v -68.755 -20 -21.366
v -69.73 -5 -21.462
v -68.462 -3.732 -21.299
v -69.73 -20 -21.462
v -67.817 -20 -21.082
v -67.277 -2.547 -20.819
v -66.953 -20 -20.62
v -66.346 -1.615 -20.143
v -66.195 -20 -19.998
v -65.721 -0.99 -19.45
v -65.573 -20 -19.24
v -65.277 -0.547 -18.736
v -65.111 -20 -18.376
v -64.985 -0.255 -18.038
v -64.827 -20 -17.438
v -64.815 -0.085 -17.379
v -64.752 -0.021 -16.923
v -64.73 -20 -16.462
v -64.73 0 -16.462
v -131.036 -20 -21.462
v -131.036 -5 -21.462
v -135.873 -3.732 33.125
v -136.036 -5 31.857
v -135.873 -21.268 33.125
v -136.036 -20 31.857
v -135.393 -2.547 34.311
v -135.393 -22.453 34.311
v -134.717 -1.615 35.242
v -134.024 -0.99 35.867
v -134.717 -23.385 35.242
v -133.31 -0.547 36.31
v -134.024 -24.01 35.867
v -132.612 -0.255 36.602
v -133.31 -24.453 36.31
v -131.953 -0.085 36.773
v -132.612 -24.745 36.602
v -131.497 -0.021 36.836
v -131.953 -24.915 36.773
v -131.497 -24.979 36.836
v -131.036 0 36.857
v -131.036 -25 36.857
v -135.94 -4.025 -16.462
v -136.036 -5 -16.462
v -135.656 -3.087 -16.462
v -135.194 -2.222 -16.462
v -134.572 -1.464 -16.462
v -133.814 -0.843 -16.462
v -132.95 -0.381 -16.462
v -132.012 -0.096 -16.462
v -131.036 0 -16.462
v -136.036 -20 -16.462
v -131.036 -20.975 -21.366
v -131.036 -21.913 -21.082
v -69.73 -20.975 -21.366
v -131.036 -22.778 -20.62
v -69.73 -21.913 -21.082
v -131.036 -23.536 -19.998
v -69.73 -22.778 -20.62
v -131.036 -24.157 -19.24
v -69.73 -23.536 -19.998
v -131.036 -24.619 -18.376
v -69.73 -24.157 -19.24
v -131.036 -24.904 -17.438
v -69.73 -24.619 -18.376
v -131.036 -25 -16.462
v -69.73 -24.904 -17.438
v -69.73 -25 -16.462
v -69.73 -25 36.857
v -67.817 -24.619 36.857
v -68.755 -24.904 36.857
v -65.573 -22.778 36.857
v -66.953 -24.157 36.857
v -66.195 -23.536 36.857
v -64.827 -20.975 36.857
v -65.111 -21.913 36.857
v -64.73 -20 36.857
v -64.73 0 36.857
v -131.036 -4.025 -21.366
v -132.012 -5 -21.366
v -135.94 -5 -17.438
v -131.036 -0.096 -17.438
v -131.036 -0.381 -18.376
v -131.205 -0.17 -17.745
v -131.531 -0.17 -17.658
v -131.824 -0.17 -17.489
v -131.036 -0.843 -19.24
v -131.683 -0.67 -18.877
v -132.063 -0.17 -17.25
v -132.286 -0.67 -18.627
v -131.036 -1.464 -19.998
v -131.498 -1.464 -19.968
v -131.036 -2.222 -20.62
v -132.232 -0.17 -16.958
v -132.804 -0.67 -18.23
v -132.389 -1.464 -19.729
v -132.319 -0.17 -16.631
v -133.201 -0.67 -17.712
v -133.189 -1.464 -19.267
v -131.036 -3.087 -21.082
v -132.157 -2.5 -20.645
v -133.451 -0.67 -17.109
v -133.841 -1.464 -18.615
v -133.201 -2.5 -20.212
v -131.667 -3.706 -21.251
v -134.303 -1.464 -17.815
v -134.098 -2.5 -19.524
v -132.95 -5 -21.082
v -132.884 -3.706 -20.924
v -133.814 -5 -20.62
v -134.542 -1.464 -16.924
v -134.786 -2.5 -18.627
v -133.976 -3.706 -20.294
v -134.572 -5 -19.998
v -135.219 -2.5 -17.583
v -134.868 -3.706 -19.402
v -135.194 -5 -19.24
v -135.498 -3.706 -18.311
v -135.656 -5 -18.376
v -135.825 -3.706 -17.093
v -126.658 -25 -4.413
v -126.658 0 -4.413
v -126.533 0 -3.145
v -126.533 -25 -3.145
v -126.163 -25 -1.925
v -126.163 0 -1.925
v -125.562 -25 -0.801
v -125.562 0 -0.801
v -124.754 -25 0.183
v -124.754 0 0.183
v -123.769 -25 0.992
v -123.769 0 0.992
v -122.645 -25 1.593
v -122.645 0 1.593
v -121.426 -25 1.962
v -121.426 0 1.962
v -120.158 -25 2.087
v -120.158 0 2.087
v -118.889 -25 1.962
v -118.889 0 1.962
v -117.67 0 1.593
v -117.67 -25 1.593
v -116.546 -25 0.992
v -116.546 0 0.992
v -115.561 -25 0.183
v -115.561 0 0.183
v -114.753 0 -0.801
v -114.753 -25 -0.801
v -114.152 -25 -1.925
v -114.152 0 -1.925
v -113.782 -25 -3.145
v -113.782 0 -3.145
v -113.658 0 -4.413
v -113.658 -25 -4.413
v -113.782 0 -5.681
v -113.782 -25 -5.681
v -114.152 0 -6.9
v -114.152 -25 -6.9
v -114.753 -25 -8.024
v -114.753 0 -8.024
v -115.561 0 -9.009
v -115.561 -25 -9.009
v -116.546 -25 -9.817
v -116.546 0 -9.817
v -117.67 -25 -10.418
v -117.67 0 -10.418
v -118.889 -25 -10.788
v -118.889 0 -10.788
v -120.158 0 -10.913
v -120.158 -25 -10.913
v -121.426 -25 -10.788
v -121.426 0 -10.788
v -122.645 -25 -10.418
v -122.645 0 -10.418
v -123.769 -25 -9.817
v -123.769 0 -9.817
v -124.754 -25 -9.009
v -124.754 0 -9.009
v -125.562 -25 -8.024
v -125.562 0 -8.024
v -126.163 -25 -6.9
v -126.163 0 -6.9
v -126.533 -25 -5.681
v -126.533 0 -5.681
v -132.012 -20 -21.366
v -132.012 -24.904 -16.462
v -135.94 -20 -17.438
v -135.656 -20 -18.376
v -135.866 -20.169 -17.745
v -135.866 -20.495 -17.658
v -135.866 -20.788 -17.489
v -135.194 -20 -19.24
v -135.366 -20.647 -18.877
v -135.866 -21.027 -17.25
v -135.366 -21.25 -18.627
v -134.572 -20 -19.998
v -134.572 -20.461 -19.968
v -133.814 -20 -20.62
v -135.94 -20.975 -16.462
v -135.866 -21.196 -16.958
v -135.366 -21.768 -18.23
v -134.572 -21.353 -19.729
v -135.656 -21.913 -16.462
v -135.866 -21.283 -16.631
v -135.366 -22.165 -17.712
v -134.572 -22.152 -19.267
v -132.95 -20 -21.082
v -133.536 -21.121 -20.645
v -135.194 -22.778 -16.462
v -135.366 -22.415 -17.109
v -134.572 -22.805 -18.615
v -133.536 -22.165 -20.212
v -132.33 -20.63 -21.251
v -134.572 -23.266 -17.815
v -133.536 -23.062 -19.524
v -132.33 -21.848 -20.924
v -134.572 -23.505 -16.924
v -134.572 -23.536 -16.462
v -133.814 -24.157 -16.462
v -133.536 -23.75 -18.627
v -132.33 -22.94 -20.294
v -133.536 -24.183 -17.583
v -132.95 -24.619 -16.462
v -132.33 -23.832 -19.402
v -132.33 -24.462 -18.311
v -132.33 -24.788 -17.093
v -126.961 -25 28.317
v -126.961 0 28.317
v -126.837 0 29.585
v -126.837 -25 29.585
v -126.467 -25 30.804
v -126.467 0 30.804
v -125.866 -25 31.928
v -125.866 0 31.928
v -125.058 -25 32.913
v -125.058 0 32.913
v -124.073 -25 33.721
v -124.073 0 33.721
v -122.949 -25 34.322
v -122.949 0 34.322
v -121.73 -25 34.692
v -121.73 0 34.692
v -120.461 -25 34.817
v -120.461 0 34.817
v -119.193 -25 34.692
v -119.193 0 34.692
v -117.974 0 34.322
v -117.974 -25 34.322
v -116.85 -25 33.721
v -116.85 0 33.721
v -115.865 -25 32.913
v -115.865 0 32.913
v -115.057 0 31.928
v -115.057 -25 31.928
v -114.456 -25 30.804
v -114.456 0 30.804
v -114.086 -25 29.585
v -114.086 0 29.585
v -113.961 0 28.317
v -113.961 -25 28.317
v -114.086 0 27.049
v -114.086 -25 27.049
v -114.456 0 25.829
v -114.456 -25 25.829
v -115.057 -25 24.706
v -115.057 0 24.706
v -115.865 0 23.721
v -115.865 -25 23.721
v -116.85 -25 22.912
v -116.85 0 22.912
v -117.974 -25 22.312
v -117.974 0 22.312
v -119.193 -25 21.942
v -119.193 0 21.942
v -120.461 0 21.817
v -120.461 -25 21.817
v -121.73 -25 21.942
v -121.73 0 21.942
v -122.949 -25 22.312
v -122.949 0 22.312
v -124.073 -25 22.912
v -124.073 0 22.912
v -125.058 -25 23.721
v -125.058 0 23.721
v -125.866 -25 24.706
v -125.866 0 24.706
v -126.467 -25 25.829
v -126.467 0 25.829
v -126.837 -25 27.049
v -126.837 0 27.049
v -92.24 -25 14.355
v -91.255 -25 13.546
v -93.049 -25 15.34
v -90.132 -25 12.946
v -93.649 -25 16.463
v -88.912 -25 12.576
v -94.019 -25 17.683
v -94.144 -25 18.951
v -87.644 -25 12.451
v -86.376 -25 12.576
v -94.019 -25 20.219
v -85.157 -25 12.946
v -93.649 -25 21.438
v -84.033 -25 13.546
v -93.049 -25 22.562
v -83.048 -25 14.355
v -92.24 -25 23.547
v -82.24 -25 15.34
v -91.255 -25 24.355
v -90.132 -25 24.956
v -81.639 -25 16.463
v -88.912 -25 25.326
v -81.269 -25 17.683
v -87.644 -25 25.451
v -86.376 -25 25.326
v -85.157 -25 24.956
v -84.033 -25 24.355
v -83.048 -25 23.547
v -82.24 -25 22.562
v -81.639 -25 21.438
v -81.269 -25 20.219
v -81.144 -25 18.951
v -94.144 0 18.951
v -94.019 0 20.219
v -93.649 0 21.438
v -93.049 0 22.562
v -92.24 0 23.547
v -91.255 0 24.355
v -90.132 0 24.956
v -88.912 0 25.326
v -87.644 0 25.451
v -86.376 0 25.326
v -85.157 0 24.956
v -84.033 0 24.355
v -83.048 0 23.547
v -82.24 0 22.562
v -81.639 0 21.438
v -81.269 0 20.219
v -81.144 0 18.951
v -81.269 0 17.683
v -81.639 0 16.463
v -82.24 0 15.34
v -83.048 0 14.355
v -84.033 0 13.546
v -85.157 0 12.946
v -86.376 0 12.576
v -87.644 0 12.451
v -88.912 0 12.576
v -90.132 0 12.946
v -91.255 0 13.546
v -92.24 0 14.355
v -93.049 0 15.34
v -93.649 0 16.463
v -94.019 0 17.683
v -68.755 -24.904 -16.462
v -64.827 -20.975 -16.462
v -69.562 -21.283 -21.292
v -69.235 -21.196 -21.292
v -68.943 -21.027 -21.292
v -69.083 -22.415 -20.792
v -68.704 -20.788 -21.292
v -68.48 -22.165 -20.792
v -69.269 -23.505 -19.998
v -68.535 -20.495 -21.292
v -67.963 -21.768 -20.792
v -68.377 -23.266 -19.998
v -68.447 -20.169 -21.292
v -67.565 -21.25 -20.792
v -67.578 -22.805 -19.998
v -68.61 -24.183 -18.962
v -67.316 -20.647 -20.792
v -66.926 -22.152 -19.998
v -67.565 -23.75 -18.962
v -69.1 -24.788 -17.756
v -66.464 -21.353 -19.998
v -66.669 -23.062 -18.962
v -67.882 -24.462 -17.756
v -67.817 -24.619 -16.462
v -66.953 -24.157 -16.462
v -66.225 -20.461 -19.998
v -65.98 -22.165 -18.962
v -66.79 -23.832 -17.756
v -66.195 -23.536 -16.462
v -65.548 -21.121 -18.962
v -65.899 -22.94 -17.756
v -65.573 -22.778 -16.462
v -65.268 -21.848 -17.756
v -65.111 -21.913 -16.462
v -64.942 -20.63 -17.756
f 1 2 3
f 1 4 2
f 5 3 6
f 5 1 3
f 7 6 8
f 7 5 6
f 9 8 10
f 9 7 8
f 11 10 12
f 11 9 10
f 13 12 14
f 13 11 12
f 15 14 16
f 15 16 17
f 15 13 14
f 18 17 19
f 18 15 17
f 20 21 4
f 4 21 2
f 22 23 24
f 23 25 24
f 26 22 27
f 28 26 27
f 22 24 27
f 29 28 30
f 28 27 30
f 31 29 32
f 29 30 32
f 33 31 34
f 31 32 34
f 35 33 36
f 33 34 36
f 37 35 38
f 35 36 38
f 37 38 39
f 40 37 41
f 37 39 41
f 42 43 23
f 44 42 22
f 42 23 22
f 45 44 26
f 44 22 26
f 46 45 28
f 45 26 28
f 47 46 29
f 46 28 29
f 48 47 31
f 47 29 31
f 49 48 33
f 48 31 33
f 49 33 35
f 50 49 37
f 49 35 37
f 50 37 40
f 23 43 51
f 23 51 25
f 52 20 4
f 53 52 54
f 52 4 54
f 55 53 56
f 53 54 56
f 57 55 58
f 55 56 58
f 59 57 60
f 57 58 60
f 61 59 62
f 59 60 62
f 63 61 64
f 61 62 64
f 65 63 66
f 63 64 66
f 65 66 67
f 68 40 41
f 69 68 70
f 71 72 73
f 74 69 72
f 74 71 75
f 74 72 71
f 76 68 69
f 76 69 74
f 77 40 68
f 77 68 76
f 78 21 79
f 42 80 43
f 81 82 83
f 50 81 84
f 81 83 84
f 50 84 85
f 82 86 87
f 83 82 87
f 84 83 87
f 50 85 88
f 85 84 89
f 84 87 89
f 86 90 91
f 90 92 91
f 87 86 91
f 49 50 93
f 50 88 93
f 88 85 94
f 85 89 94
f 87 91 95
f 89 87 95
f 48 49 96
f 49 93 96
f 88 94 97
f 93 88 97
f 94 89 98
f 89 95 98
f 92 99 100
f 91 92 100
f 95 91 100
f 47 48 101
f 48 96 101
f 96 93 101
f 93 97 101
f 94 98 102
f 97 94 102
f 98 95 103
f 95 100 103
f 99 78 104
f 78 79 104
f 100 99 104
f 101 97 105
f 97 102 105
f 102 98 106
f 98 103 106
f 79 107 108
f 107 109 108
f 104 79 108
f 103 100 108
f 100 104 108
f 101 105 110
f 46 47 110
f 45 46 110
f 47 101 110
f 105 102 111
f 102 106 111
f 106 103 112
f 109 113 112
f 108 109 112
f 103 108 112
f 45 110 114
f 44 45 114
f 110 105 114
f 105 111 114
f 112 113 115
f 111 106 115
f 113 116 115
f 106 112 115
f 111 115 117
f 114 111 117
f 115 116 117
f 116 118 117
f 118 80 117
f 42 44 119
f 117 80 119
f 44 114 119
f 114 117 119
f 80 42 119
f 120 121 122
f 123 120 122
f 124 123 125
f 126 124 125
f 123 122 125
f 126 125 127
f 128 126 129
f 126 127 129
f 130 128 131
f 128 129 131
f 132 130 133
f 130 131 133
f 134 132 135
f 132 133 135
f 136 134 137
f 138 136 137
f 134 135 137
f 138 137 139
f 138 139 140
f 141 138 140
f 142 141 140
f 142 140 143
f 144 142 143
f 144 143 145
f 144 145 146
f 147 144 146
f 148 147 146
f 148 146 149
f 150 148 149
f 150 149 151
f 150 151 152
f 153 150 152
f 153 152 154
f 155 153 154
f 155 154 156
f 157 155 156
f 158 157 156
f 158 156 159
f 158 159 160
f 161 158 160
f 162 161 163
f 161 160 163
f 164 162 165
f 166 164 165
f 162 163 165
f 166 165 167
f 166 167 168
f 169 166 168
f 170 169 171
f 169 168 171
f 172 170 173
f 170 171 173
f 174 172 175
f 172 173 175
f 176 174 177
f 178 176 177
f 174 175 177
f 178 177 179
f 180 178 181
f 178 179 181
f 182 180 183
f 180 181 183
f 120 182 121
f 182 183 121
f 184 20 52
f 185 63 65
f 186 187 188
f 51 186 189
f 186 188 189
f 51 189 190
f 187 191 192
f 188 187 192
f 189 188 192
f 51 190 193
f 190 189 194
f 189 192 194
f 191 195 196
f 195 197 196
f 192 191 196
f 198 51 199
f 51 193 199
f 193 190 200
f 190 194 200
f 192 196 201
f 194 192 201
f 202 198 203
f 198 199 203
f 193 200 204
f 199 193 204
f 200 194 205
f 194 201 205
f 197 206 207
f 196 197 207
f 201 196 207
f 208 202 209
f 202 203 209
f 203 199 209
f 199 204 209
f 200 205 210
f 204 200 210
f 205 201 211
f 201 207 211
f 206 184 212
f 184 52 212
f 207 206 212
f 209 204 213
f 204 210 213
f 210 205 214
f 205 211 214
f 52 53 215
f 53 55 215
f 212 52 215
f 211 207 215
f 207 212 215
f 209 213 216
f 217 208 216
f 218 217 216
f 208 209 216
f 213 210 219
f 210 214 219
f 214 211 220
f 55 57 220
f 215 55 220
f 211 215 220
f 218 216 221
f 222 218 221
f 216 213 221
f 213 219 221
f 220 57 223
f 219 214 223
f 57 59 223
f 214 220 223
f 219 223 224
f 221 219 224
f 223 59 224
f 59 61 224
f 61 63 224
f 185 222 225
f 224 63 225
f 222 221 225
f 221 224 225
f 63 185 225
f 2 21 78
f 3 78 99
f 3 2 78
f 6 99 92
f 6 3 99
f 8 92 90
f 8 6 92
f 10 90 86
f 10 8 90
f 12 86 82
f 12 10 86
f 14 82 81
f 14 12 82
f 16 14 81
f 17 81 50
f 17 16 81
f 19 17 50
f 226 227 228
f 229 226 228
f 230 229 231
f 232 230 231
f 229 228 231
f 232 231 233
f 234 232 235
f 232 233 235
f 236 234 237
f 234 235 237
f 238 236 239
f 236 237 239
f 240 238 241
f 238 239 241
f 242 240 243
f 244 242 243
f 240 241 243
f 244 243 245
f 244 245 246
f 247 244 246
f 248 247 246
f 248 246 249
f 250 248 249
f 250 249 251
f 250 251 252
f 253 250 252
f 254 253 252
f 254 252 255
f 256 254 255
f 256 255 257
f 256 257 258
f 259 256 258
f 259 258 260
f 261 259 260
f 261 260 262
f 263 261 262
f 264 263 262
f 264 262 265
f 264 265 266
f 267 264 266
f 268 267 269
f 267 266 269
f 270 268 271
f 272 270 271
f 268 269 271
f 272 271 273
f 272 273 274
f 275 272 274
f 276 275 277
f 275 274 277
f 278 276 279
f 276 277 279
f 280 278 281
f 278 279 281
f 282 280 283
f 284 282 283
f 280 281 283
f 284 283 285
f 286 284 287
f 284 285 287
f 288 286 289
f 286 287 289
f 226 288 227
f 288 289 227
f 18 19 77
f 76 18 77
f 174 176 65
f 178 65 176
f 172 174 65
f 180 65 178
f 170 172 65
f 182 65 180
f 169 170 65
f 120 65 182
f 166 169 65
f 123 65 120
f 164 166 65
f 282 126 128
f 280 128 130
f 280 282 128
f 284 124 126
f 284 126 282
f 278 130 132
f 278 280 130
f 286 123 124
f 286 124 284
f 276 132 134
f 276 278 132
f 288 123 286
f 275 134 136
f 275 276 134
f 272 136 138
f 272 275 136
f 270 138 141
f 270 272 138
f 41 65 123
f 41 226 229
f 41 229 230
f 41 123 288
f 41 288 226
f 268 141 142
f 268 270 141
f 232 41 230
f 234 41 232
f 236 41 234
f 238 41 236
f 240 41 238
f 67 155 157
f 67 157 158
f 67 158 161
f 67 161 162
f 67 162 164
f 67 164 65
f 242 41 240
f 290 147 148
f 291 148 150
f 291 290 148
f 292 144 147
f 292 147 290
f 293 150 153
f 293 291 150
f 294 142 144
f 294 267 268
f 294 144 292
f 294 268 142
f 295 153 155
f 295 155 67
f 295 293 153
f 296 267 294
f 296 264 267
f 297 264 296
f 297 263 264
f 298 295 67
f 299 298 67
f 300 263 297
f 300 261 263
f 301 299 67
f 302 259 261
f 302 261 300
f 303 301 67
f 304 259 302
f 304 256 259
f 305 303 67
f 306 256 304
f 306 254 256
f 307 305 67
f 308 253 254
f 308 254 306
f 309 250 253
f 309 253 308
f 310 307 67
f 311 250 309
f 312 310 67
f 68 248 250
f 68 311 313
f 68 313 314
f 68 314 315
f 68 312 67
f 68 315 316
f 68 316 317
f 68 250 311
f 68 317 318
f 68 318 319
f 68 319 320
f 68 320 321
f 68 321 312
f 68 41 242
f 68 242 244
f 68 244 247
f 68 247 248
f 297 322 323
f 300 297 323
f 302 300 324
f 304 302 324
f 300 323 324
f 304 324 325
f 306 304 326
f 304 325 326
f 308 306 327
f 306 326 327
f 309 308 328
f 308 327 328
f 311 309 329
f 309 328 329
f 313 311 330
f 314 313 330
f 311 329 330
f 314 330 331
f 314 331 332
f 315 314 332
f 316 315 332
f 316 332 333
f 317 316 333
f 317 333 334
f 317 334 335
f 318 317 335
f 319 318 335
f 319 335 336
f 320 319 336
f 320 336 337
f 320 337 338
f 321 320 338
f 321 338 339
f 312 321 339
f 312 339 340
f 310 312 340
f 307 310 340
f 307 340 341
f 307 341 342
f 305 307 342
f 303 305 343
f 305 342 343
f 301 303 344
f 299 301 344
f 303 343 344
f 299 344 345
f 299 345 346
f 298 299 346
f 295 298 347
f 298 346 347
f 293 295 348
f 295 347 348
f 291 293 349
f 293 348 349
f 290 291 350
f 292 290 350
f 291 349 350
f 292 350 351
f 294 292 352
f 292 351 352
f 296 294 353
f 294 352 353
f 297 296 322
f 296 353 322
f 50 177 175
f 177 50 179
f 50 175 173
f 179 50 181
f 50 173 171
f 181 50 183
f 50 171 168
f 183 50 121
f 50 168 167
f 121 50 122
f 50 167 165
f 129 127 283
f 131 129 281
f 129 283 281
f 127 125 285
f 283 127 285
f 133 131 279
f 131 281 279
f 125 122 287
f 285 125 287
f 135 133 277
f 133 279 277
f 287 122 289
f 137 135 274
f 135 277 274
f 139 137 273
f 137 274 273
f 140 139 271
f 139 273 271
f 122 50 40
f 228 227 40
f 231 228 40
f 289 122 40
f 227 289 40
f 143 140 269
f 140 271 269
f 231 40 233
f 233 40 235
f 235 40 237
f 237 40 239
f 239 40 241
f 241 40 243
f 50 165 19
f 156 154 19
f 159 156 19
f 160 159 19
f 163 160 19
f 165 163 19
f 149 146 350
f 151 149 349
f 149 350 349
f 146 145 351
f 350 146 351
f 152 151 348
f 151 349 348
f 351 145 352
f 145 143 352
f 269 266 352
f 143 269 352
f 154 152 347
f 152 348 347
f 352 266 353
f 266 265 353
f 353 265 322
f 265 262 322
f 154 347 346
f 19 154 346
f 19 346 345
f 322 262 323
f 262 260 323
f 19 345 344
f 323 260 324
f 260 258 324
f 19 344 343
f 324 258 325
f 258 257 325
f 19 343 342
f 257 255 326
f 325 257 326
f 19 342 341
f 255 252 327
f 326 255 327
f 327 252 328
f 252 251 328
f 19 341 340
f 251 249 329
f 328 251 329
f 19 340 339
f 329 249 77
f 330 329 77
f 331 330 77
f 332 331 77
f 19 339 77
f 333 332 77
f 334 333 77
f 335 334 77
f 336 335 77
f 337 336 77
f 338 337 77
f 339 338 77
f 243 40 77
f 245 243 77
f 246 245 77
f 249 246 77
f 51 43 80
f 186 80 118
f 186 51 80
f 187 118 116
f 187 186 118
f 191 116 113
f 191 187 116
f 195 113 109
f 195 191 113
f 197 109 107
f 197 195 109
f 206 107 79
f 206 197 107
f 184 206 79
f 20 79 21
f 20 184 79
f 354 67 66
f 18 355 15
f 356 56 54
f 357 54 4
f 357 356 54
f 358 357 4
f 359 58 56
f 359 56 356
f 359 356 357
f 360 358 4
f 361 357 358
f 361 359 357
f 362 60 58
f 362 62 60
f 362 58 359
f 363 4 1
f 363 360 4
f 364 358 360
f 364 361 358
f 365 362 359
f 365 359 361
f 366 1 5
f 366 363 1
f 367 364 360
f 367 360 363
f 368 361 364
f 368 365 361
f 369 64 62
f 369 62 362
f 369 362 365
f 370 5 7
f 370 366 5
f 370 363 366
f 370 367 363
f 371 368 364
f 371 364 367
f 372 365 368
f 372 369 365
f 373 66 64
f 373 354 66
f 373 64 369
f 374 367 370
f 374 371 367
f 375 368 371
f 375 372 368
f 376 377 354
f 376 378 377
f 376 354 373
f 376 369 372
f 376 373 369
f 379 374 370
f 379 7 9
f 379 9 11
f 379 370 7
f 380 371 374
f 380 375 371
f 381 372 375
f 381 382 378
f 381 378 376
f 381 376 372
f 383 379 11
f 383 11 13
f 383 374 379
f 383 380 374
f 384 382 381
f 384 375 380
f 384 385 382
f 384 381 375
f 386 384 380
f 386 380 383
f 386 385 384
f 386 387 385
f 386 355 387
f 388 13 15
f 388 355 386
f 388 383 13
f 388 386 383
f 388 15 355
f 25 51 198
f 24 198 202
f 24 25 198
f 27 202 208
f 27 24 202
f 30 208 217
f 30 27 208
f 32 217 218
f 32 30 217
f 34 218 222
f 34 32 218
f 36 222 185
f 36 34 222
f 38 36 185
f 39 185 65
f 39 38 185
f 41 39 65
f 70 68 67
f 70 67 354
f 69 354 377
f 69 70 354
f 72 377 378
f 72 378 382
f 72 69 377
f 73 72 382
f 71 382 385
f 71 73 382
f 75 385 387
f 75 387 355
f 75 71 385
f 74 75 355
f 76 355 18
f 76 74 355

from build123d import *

# Parameters (mm, degrees)
F0_W     = 71.305797
F0_H     = 58.31974
F1_DEPTH = 25
F3_D     = 13
F3_DEPTH = 51
F4_R     = 5


with BuildPart() as f1:
    # F0 (on Front) → F1 (new body)
    with BuildSketch(Plane.XZ):
        with Locations((-100.383364, 7.697545)):
            Rectangle(F0_W, F0_H)
    extrude(amount=F1_DEPTH)

    # F3
    with Locations(Plane.XZ.offset(25)):
        with Locations((-120.461434, 28.316814), (-120.157562, -4.412703), (-87.64419, 18.950811)):
            Hole(F3_D / 2, depth=F3_DEPTH)

    # F4
    f4_edges = [f1.edges().sort_by_distance(p)[0] for p in [
        (-64.730465, -25, 7.697545),
        (-100.383364, -25, -21.462325),
        (-136.036262, -12.5, -21.462325),
        (-64.730465, -12.5, -21.462325),
        (-100.383364, 0, -21.462325),
        (-136.036262, -12.5, 36.857415),
        (-136.036262, 0, 7.697545),
        (-136.036262, -25, 7.697545),
    ]]
    fillet(f4_edges, radius=F4_R)


solid = f1.part
